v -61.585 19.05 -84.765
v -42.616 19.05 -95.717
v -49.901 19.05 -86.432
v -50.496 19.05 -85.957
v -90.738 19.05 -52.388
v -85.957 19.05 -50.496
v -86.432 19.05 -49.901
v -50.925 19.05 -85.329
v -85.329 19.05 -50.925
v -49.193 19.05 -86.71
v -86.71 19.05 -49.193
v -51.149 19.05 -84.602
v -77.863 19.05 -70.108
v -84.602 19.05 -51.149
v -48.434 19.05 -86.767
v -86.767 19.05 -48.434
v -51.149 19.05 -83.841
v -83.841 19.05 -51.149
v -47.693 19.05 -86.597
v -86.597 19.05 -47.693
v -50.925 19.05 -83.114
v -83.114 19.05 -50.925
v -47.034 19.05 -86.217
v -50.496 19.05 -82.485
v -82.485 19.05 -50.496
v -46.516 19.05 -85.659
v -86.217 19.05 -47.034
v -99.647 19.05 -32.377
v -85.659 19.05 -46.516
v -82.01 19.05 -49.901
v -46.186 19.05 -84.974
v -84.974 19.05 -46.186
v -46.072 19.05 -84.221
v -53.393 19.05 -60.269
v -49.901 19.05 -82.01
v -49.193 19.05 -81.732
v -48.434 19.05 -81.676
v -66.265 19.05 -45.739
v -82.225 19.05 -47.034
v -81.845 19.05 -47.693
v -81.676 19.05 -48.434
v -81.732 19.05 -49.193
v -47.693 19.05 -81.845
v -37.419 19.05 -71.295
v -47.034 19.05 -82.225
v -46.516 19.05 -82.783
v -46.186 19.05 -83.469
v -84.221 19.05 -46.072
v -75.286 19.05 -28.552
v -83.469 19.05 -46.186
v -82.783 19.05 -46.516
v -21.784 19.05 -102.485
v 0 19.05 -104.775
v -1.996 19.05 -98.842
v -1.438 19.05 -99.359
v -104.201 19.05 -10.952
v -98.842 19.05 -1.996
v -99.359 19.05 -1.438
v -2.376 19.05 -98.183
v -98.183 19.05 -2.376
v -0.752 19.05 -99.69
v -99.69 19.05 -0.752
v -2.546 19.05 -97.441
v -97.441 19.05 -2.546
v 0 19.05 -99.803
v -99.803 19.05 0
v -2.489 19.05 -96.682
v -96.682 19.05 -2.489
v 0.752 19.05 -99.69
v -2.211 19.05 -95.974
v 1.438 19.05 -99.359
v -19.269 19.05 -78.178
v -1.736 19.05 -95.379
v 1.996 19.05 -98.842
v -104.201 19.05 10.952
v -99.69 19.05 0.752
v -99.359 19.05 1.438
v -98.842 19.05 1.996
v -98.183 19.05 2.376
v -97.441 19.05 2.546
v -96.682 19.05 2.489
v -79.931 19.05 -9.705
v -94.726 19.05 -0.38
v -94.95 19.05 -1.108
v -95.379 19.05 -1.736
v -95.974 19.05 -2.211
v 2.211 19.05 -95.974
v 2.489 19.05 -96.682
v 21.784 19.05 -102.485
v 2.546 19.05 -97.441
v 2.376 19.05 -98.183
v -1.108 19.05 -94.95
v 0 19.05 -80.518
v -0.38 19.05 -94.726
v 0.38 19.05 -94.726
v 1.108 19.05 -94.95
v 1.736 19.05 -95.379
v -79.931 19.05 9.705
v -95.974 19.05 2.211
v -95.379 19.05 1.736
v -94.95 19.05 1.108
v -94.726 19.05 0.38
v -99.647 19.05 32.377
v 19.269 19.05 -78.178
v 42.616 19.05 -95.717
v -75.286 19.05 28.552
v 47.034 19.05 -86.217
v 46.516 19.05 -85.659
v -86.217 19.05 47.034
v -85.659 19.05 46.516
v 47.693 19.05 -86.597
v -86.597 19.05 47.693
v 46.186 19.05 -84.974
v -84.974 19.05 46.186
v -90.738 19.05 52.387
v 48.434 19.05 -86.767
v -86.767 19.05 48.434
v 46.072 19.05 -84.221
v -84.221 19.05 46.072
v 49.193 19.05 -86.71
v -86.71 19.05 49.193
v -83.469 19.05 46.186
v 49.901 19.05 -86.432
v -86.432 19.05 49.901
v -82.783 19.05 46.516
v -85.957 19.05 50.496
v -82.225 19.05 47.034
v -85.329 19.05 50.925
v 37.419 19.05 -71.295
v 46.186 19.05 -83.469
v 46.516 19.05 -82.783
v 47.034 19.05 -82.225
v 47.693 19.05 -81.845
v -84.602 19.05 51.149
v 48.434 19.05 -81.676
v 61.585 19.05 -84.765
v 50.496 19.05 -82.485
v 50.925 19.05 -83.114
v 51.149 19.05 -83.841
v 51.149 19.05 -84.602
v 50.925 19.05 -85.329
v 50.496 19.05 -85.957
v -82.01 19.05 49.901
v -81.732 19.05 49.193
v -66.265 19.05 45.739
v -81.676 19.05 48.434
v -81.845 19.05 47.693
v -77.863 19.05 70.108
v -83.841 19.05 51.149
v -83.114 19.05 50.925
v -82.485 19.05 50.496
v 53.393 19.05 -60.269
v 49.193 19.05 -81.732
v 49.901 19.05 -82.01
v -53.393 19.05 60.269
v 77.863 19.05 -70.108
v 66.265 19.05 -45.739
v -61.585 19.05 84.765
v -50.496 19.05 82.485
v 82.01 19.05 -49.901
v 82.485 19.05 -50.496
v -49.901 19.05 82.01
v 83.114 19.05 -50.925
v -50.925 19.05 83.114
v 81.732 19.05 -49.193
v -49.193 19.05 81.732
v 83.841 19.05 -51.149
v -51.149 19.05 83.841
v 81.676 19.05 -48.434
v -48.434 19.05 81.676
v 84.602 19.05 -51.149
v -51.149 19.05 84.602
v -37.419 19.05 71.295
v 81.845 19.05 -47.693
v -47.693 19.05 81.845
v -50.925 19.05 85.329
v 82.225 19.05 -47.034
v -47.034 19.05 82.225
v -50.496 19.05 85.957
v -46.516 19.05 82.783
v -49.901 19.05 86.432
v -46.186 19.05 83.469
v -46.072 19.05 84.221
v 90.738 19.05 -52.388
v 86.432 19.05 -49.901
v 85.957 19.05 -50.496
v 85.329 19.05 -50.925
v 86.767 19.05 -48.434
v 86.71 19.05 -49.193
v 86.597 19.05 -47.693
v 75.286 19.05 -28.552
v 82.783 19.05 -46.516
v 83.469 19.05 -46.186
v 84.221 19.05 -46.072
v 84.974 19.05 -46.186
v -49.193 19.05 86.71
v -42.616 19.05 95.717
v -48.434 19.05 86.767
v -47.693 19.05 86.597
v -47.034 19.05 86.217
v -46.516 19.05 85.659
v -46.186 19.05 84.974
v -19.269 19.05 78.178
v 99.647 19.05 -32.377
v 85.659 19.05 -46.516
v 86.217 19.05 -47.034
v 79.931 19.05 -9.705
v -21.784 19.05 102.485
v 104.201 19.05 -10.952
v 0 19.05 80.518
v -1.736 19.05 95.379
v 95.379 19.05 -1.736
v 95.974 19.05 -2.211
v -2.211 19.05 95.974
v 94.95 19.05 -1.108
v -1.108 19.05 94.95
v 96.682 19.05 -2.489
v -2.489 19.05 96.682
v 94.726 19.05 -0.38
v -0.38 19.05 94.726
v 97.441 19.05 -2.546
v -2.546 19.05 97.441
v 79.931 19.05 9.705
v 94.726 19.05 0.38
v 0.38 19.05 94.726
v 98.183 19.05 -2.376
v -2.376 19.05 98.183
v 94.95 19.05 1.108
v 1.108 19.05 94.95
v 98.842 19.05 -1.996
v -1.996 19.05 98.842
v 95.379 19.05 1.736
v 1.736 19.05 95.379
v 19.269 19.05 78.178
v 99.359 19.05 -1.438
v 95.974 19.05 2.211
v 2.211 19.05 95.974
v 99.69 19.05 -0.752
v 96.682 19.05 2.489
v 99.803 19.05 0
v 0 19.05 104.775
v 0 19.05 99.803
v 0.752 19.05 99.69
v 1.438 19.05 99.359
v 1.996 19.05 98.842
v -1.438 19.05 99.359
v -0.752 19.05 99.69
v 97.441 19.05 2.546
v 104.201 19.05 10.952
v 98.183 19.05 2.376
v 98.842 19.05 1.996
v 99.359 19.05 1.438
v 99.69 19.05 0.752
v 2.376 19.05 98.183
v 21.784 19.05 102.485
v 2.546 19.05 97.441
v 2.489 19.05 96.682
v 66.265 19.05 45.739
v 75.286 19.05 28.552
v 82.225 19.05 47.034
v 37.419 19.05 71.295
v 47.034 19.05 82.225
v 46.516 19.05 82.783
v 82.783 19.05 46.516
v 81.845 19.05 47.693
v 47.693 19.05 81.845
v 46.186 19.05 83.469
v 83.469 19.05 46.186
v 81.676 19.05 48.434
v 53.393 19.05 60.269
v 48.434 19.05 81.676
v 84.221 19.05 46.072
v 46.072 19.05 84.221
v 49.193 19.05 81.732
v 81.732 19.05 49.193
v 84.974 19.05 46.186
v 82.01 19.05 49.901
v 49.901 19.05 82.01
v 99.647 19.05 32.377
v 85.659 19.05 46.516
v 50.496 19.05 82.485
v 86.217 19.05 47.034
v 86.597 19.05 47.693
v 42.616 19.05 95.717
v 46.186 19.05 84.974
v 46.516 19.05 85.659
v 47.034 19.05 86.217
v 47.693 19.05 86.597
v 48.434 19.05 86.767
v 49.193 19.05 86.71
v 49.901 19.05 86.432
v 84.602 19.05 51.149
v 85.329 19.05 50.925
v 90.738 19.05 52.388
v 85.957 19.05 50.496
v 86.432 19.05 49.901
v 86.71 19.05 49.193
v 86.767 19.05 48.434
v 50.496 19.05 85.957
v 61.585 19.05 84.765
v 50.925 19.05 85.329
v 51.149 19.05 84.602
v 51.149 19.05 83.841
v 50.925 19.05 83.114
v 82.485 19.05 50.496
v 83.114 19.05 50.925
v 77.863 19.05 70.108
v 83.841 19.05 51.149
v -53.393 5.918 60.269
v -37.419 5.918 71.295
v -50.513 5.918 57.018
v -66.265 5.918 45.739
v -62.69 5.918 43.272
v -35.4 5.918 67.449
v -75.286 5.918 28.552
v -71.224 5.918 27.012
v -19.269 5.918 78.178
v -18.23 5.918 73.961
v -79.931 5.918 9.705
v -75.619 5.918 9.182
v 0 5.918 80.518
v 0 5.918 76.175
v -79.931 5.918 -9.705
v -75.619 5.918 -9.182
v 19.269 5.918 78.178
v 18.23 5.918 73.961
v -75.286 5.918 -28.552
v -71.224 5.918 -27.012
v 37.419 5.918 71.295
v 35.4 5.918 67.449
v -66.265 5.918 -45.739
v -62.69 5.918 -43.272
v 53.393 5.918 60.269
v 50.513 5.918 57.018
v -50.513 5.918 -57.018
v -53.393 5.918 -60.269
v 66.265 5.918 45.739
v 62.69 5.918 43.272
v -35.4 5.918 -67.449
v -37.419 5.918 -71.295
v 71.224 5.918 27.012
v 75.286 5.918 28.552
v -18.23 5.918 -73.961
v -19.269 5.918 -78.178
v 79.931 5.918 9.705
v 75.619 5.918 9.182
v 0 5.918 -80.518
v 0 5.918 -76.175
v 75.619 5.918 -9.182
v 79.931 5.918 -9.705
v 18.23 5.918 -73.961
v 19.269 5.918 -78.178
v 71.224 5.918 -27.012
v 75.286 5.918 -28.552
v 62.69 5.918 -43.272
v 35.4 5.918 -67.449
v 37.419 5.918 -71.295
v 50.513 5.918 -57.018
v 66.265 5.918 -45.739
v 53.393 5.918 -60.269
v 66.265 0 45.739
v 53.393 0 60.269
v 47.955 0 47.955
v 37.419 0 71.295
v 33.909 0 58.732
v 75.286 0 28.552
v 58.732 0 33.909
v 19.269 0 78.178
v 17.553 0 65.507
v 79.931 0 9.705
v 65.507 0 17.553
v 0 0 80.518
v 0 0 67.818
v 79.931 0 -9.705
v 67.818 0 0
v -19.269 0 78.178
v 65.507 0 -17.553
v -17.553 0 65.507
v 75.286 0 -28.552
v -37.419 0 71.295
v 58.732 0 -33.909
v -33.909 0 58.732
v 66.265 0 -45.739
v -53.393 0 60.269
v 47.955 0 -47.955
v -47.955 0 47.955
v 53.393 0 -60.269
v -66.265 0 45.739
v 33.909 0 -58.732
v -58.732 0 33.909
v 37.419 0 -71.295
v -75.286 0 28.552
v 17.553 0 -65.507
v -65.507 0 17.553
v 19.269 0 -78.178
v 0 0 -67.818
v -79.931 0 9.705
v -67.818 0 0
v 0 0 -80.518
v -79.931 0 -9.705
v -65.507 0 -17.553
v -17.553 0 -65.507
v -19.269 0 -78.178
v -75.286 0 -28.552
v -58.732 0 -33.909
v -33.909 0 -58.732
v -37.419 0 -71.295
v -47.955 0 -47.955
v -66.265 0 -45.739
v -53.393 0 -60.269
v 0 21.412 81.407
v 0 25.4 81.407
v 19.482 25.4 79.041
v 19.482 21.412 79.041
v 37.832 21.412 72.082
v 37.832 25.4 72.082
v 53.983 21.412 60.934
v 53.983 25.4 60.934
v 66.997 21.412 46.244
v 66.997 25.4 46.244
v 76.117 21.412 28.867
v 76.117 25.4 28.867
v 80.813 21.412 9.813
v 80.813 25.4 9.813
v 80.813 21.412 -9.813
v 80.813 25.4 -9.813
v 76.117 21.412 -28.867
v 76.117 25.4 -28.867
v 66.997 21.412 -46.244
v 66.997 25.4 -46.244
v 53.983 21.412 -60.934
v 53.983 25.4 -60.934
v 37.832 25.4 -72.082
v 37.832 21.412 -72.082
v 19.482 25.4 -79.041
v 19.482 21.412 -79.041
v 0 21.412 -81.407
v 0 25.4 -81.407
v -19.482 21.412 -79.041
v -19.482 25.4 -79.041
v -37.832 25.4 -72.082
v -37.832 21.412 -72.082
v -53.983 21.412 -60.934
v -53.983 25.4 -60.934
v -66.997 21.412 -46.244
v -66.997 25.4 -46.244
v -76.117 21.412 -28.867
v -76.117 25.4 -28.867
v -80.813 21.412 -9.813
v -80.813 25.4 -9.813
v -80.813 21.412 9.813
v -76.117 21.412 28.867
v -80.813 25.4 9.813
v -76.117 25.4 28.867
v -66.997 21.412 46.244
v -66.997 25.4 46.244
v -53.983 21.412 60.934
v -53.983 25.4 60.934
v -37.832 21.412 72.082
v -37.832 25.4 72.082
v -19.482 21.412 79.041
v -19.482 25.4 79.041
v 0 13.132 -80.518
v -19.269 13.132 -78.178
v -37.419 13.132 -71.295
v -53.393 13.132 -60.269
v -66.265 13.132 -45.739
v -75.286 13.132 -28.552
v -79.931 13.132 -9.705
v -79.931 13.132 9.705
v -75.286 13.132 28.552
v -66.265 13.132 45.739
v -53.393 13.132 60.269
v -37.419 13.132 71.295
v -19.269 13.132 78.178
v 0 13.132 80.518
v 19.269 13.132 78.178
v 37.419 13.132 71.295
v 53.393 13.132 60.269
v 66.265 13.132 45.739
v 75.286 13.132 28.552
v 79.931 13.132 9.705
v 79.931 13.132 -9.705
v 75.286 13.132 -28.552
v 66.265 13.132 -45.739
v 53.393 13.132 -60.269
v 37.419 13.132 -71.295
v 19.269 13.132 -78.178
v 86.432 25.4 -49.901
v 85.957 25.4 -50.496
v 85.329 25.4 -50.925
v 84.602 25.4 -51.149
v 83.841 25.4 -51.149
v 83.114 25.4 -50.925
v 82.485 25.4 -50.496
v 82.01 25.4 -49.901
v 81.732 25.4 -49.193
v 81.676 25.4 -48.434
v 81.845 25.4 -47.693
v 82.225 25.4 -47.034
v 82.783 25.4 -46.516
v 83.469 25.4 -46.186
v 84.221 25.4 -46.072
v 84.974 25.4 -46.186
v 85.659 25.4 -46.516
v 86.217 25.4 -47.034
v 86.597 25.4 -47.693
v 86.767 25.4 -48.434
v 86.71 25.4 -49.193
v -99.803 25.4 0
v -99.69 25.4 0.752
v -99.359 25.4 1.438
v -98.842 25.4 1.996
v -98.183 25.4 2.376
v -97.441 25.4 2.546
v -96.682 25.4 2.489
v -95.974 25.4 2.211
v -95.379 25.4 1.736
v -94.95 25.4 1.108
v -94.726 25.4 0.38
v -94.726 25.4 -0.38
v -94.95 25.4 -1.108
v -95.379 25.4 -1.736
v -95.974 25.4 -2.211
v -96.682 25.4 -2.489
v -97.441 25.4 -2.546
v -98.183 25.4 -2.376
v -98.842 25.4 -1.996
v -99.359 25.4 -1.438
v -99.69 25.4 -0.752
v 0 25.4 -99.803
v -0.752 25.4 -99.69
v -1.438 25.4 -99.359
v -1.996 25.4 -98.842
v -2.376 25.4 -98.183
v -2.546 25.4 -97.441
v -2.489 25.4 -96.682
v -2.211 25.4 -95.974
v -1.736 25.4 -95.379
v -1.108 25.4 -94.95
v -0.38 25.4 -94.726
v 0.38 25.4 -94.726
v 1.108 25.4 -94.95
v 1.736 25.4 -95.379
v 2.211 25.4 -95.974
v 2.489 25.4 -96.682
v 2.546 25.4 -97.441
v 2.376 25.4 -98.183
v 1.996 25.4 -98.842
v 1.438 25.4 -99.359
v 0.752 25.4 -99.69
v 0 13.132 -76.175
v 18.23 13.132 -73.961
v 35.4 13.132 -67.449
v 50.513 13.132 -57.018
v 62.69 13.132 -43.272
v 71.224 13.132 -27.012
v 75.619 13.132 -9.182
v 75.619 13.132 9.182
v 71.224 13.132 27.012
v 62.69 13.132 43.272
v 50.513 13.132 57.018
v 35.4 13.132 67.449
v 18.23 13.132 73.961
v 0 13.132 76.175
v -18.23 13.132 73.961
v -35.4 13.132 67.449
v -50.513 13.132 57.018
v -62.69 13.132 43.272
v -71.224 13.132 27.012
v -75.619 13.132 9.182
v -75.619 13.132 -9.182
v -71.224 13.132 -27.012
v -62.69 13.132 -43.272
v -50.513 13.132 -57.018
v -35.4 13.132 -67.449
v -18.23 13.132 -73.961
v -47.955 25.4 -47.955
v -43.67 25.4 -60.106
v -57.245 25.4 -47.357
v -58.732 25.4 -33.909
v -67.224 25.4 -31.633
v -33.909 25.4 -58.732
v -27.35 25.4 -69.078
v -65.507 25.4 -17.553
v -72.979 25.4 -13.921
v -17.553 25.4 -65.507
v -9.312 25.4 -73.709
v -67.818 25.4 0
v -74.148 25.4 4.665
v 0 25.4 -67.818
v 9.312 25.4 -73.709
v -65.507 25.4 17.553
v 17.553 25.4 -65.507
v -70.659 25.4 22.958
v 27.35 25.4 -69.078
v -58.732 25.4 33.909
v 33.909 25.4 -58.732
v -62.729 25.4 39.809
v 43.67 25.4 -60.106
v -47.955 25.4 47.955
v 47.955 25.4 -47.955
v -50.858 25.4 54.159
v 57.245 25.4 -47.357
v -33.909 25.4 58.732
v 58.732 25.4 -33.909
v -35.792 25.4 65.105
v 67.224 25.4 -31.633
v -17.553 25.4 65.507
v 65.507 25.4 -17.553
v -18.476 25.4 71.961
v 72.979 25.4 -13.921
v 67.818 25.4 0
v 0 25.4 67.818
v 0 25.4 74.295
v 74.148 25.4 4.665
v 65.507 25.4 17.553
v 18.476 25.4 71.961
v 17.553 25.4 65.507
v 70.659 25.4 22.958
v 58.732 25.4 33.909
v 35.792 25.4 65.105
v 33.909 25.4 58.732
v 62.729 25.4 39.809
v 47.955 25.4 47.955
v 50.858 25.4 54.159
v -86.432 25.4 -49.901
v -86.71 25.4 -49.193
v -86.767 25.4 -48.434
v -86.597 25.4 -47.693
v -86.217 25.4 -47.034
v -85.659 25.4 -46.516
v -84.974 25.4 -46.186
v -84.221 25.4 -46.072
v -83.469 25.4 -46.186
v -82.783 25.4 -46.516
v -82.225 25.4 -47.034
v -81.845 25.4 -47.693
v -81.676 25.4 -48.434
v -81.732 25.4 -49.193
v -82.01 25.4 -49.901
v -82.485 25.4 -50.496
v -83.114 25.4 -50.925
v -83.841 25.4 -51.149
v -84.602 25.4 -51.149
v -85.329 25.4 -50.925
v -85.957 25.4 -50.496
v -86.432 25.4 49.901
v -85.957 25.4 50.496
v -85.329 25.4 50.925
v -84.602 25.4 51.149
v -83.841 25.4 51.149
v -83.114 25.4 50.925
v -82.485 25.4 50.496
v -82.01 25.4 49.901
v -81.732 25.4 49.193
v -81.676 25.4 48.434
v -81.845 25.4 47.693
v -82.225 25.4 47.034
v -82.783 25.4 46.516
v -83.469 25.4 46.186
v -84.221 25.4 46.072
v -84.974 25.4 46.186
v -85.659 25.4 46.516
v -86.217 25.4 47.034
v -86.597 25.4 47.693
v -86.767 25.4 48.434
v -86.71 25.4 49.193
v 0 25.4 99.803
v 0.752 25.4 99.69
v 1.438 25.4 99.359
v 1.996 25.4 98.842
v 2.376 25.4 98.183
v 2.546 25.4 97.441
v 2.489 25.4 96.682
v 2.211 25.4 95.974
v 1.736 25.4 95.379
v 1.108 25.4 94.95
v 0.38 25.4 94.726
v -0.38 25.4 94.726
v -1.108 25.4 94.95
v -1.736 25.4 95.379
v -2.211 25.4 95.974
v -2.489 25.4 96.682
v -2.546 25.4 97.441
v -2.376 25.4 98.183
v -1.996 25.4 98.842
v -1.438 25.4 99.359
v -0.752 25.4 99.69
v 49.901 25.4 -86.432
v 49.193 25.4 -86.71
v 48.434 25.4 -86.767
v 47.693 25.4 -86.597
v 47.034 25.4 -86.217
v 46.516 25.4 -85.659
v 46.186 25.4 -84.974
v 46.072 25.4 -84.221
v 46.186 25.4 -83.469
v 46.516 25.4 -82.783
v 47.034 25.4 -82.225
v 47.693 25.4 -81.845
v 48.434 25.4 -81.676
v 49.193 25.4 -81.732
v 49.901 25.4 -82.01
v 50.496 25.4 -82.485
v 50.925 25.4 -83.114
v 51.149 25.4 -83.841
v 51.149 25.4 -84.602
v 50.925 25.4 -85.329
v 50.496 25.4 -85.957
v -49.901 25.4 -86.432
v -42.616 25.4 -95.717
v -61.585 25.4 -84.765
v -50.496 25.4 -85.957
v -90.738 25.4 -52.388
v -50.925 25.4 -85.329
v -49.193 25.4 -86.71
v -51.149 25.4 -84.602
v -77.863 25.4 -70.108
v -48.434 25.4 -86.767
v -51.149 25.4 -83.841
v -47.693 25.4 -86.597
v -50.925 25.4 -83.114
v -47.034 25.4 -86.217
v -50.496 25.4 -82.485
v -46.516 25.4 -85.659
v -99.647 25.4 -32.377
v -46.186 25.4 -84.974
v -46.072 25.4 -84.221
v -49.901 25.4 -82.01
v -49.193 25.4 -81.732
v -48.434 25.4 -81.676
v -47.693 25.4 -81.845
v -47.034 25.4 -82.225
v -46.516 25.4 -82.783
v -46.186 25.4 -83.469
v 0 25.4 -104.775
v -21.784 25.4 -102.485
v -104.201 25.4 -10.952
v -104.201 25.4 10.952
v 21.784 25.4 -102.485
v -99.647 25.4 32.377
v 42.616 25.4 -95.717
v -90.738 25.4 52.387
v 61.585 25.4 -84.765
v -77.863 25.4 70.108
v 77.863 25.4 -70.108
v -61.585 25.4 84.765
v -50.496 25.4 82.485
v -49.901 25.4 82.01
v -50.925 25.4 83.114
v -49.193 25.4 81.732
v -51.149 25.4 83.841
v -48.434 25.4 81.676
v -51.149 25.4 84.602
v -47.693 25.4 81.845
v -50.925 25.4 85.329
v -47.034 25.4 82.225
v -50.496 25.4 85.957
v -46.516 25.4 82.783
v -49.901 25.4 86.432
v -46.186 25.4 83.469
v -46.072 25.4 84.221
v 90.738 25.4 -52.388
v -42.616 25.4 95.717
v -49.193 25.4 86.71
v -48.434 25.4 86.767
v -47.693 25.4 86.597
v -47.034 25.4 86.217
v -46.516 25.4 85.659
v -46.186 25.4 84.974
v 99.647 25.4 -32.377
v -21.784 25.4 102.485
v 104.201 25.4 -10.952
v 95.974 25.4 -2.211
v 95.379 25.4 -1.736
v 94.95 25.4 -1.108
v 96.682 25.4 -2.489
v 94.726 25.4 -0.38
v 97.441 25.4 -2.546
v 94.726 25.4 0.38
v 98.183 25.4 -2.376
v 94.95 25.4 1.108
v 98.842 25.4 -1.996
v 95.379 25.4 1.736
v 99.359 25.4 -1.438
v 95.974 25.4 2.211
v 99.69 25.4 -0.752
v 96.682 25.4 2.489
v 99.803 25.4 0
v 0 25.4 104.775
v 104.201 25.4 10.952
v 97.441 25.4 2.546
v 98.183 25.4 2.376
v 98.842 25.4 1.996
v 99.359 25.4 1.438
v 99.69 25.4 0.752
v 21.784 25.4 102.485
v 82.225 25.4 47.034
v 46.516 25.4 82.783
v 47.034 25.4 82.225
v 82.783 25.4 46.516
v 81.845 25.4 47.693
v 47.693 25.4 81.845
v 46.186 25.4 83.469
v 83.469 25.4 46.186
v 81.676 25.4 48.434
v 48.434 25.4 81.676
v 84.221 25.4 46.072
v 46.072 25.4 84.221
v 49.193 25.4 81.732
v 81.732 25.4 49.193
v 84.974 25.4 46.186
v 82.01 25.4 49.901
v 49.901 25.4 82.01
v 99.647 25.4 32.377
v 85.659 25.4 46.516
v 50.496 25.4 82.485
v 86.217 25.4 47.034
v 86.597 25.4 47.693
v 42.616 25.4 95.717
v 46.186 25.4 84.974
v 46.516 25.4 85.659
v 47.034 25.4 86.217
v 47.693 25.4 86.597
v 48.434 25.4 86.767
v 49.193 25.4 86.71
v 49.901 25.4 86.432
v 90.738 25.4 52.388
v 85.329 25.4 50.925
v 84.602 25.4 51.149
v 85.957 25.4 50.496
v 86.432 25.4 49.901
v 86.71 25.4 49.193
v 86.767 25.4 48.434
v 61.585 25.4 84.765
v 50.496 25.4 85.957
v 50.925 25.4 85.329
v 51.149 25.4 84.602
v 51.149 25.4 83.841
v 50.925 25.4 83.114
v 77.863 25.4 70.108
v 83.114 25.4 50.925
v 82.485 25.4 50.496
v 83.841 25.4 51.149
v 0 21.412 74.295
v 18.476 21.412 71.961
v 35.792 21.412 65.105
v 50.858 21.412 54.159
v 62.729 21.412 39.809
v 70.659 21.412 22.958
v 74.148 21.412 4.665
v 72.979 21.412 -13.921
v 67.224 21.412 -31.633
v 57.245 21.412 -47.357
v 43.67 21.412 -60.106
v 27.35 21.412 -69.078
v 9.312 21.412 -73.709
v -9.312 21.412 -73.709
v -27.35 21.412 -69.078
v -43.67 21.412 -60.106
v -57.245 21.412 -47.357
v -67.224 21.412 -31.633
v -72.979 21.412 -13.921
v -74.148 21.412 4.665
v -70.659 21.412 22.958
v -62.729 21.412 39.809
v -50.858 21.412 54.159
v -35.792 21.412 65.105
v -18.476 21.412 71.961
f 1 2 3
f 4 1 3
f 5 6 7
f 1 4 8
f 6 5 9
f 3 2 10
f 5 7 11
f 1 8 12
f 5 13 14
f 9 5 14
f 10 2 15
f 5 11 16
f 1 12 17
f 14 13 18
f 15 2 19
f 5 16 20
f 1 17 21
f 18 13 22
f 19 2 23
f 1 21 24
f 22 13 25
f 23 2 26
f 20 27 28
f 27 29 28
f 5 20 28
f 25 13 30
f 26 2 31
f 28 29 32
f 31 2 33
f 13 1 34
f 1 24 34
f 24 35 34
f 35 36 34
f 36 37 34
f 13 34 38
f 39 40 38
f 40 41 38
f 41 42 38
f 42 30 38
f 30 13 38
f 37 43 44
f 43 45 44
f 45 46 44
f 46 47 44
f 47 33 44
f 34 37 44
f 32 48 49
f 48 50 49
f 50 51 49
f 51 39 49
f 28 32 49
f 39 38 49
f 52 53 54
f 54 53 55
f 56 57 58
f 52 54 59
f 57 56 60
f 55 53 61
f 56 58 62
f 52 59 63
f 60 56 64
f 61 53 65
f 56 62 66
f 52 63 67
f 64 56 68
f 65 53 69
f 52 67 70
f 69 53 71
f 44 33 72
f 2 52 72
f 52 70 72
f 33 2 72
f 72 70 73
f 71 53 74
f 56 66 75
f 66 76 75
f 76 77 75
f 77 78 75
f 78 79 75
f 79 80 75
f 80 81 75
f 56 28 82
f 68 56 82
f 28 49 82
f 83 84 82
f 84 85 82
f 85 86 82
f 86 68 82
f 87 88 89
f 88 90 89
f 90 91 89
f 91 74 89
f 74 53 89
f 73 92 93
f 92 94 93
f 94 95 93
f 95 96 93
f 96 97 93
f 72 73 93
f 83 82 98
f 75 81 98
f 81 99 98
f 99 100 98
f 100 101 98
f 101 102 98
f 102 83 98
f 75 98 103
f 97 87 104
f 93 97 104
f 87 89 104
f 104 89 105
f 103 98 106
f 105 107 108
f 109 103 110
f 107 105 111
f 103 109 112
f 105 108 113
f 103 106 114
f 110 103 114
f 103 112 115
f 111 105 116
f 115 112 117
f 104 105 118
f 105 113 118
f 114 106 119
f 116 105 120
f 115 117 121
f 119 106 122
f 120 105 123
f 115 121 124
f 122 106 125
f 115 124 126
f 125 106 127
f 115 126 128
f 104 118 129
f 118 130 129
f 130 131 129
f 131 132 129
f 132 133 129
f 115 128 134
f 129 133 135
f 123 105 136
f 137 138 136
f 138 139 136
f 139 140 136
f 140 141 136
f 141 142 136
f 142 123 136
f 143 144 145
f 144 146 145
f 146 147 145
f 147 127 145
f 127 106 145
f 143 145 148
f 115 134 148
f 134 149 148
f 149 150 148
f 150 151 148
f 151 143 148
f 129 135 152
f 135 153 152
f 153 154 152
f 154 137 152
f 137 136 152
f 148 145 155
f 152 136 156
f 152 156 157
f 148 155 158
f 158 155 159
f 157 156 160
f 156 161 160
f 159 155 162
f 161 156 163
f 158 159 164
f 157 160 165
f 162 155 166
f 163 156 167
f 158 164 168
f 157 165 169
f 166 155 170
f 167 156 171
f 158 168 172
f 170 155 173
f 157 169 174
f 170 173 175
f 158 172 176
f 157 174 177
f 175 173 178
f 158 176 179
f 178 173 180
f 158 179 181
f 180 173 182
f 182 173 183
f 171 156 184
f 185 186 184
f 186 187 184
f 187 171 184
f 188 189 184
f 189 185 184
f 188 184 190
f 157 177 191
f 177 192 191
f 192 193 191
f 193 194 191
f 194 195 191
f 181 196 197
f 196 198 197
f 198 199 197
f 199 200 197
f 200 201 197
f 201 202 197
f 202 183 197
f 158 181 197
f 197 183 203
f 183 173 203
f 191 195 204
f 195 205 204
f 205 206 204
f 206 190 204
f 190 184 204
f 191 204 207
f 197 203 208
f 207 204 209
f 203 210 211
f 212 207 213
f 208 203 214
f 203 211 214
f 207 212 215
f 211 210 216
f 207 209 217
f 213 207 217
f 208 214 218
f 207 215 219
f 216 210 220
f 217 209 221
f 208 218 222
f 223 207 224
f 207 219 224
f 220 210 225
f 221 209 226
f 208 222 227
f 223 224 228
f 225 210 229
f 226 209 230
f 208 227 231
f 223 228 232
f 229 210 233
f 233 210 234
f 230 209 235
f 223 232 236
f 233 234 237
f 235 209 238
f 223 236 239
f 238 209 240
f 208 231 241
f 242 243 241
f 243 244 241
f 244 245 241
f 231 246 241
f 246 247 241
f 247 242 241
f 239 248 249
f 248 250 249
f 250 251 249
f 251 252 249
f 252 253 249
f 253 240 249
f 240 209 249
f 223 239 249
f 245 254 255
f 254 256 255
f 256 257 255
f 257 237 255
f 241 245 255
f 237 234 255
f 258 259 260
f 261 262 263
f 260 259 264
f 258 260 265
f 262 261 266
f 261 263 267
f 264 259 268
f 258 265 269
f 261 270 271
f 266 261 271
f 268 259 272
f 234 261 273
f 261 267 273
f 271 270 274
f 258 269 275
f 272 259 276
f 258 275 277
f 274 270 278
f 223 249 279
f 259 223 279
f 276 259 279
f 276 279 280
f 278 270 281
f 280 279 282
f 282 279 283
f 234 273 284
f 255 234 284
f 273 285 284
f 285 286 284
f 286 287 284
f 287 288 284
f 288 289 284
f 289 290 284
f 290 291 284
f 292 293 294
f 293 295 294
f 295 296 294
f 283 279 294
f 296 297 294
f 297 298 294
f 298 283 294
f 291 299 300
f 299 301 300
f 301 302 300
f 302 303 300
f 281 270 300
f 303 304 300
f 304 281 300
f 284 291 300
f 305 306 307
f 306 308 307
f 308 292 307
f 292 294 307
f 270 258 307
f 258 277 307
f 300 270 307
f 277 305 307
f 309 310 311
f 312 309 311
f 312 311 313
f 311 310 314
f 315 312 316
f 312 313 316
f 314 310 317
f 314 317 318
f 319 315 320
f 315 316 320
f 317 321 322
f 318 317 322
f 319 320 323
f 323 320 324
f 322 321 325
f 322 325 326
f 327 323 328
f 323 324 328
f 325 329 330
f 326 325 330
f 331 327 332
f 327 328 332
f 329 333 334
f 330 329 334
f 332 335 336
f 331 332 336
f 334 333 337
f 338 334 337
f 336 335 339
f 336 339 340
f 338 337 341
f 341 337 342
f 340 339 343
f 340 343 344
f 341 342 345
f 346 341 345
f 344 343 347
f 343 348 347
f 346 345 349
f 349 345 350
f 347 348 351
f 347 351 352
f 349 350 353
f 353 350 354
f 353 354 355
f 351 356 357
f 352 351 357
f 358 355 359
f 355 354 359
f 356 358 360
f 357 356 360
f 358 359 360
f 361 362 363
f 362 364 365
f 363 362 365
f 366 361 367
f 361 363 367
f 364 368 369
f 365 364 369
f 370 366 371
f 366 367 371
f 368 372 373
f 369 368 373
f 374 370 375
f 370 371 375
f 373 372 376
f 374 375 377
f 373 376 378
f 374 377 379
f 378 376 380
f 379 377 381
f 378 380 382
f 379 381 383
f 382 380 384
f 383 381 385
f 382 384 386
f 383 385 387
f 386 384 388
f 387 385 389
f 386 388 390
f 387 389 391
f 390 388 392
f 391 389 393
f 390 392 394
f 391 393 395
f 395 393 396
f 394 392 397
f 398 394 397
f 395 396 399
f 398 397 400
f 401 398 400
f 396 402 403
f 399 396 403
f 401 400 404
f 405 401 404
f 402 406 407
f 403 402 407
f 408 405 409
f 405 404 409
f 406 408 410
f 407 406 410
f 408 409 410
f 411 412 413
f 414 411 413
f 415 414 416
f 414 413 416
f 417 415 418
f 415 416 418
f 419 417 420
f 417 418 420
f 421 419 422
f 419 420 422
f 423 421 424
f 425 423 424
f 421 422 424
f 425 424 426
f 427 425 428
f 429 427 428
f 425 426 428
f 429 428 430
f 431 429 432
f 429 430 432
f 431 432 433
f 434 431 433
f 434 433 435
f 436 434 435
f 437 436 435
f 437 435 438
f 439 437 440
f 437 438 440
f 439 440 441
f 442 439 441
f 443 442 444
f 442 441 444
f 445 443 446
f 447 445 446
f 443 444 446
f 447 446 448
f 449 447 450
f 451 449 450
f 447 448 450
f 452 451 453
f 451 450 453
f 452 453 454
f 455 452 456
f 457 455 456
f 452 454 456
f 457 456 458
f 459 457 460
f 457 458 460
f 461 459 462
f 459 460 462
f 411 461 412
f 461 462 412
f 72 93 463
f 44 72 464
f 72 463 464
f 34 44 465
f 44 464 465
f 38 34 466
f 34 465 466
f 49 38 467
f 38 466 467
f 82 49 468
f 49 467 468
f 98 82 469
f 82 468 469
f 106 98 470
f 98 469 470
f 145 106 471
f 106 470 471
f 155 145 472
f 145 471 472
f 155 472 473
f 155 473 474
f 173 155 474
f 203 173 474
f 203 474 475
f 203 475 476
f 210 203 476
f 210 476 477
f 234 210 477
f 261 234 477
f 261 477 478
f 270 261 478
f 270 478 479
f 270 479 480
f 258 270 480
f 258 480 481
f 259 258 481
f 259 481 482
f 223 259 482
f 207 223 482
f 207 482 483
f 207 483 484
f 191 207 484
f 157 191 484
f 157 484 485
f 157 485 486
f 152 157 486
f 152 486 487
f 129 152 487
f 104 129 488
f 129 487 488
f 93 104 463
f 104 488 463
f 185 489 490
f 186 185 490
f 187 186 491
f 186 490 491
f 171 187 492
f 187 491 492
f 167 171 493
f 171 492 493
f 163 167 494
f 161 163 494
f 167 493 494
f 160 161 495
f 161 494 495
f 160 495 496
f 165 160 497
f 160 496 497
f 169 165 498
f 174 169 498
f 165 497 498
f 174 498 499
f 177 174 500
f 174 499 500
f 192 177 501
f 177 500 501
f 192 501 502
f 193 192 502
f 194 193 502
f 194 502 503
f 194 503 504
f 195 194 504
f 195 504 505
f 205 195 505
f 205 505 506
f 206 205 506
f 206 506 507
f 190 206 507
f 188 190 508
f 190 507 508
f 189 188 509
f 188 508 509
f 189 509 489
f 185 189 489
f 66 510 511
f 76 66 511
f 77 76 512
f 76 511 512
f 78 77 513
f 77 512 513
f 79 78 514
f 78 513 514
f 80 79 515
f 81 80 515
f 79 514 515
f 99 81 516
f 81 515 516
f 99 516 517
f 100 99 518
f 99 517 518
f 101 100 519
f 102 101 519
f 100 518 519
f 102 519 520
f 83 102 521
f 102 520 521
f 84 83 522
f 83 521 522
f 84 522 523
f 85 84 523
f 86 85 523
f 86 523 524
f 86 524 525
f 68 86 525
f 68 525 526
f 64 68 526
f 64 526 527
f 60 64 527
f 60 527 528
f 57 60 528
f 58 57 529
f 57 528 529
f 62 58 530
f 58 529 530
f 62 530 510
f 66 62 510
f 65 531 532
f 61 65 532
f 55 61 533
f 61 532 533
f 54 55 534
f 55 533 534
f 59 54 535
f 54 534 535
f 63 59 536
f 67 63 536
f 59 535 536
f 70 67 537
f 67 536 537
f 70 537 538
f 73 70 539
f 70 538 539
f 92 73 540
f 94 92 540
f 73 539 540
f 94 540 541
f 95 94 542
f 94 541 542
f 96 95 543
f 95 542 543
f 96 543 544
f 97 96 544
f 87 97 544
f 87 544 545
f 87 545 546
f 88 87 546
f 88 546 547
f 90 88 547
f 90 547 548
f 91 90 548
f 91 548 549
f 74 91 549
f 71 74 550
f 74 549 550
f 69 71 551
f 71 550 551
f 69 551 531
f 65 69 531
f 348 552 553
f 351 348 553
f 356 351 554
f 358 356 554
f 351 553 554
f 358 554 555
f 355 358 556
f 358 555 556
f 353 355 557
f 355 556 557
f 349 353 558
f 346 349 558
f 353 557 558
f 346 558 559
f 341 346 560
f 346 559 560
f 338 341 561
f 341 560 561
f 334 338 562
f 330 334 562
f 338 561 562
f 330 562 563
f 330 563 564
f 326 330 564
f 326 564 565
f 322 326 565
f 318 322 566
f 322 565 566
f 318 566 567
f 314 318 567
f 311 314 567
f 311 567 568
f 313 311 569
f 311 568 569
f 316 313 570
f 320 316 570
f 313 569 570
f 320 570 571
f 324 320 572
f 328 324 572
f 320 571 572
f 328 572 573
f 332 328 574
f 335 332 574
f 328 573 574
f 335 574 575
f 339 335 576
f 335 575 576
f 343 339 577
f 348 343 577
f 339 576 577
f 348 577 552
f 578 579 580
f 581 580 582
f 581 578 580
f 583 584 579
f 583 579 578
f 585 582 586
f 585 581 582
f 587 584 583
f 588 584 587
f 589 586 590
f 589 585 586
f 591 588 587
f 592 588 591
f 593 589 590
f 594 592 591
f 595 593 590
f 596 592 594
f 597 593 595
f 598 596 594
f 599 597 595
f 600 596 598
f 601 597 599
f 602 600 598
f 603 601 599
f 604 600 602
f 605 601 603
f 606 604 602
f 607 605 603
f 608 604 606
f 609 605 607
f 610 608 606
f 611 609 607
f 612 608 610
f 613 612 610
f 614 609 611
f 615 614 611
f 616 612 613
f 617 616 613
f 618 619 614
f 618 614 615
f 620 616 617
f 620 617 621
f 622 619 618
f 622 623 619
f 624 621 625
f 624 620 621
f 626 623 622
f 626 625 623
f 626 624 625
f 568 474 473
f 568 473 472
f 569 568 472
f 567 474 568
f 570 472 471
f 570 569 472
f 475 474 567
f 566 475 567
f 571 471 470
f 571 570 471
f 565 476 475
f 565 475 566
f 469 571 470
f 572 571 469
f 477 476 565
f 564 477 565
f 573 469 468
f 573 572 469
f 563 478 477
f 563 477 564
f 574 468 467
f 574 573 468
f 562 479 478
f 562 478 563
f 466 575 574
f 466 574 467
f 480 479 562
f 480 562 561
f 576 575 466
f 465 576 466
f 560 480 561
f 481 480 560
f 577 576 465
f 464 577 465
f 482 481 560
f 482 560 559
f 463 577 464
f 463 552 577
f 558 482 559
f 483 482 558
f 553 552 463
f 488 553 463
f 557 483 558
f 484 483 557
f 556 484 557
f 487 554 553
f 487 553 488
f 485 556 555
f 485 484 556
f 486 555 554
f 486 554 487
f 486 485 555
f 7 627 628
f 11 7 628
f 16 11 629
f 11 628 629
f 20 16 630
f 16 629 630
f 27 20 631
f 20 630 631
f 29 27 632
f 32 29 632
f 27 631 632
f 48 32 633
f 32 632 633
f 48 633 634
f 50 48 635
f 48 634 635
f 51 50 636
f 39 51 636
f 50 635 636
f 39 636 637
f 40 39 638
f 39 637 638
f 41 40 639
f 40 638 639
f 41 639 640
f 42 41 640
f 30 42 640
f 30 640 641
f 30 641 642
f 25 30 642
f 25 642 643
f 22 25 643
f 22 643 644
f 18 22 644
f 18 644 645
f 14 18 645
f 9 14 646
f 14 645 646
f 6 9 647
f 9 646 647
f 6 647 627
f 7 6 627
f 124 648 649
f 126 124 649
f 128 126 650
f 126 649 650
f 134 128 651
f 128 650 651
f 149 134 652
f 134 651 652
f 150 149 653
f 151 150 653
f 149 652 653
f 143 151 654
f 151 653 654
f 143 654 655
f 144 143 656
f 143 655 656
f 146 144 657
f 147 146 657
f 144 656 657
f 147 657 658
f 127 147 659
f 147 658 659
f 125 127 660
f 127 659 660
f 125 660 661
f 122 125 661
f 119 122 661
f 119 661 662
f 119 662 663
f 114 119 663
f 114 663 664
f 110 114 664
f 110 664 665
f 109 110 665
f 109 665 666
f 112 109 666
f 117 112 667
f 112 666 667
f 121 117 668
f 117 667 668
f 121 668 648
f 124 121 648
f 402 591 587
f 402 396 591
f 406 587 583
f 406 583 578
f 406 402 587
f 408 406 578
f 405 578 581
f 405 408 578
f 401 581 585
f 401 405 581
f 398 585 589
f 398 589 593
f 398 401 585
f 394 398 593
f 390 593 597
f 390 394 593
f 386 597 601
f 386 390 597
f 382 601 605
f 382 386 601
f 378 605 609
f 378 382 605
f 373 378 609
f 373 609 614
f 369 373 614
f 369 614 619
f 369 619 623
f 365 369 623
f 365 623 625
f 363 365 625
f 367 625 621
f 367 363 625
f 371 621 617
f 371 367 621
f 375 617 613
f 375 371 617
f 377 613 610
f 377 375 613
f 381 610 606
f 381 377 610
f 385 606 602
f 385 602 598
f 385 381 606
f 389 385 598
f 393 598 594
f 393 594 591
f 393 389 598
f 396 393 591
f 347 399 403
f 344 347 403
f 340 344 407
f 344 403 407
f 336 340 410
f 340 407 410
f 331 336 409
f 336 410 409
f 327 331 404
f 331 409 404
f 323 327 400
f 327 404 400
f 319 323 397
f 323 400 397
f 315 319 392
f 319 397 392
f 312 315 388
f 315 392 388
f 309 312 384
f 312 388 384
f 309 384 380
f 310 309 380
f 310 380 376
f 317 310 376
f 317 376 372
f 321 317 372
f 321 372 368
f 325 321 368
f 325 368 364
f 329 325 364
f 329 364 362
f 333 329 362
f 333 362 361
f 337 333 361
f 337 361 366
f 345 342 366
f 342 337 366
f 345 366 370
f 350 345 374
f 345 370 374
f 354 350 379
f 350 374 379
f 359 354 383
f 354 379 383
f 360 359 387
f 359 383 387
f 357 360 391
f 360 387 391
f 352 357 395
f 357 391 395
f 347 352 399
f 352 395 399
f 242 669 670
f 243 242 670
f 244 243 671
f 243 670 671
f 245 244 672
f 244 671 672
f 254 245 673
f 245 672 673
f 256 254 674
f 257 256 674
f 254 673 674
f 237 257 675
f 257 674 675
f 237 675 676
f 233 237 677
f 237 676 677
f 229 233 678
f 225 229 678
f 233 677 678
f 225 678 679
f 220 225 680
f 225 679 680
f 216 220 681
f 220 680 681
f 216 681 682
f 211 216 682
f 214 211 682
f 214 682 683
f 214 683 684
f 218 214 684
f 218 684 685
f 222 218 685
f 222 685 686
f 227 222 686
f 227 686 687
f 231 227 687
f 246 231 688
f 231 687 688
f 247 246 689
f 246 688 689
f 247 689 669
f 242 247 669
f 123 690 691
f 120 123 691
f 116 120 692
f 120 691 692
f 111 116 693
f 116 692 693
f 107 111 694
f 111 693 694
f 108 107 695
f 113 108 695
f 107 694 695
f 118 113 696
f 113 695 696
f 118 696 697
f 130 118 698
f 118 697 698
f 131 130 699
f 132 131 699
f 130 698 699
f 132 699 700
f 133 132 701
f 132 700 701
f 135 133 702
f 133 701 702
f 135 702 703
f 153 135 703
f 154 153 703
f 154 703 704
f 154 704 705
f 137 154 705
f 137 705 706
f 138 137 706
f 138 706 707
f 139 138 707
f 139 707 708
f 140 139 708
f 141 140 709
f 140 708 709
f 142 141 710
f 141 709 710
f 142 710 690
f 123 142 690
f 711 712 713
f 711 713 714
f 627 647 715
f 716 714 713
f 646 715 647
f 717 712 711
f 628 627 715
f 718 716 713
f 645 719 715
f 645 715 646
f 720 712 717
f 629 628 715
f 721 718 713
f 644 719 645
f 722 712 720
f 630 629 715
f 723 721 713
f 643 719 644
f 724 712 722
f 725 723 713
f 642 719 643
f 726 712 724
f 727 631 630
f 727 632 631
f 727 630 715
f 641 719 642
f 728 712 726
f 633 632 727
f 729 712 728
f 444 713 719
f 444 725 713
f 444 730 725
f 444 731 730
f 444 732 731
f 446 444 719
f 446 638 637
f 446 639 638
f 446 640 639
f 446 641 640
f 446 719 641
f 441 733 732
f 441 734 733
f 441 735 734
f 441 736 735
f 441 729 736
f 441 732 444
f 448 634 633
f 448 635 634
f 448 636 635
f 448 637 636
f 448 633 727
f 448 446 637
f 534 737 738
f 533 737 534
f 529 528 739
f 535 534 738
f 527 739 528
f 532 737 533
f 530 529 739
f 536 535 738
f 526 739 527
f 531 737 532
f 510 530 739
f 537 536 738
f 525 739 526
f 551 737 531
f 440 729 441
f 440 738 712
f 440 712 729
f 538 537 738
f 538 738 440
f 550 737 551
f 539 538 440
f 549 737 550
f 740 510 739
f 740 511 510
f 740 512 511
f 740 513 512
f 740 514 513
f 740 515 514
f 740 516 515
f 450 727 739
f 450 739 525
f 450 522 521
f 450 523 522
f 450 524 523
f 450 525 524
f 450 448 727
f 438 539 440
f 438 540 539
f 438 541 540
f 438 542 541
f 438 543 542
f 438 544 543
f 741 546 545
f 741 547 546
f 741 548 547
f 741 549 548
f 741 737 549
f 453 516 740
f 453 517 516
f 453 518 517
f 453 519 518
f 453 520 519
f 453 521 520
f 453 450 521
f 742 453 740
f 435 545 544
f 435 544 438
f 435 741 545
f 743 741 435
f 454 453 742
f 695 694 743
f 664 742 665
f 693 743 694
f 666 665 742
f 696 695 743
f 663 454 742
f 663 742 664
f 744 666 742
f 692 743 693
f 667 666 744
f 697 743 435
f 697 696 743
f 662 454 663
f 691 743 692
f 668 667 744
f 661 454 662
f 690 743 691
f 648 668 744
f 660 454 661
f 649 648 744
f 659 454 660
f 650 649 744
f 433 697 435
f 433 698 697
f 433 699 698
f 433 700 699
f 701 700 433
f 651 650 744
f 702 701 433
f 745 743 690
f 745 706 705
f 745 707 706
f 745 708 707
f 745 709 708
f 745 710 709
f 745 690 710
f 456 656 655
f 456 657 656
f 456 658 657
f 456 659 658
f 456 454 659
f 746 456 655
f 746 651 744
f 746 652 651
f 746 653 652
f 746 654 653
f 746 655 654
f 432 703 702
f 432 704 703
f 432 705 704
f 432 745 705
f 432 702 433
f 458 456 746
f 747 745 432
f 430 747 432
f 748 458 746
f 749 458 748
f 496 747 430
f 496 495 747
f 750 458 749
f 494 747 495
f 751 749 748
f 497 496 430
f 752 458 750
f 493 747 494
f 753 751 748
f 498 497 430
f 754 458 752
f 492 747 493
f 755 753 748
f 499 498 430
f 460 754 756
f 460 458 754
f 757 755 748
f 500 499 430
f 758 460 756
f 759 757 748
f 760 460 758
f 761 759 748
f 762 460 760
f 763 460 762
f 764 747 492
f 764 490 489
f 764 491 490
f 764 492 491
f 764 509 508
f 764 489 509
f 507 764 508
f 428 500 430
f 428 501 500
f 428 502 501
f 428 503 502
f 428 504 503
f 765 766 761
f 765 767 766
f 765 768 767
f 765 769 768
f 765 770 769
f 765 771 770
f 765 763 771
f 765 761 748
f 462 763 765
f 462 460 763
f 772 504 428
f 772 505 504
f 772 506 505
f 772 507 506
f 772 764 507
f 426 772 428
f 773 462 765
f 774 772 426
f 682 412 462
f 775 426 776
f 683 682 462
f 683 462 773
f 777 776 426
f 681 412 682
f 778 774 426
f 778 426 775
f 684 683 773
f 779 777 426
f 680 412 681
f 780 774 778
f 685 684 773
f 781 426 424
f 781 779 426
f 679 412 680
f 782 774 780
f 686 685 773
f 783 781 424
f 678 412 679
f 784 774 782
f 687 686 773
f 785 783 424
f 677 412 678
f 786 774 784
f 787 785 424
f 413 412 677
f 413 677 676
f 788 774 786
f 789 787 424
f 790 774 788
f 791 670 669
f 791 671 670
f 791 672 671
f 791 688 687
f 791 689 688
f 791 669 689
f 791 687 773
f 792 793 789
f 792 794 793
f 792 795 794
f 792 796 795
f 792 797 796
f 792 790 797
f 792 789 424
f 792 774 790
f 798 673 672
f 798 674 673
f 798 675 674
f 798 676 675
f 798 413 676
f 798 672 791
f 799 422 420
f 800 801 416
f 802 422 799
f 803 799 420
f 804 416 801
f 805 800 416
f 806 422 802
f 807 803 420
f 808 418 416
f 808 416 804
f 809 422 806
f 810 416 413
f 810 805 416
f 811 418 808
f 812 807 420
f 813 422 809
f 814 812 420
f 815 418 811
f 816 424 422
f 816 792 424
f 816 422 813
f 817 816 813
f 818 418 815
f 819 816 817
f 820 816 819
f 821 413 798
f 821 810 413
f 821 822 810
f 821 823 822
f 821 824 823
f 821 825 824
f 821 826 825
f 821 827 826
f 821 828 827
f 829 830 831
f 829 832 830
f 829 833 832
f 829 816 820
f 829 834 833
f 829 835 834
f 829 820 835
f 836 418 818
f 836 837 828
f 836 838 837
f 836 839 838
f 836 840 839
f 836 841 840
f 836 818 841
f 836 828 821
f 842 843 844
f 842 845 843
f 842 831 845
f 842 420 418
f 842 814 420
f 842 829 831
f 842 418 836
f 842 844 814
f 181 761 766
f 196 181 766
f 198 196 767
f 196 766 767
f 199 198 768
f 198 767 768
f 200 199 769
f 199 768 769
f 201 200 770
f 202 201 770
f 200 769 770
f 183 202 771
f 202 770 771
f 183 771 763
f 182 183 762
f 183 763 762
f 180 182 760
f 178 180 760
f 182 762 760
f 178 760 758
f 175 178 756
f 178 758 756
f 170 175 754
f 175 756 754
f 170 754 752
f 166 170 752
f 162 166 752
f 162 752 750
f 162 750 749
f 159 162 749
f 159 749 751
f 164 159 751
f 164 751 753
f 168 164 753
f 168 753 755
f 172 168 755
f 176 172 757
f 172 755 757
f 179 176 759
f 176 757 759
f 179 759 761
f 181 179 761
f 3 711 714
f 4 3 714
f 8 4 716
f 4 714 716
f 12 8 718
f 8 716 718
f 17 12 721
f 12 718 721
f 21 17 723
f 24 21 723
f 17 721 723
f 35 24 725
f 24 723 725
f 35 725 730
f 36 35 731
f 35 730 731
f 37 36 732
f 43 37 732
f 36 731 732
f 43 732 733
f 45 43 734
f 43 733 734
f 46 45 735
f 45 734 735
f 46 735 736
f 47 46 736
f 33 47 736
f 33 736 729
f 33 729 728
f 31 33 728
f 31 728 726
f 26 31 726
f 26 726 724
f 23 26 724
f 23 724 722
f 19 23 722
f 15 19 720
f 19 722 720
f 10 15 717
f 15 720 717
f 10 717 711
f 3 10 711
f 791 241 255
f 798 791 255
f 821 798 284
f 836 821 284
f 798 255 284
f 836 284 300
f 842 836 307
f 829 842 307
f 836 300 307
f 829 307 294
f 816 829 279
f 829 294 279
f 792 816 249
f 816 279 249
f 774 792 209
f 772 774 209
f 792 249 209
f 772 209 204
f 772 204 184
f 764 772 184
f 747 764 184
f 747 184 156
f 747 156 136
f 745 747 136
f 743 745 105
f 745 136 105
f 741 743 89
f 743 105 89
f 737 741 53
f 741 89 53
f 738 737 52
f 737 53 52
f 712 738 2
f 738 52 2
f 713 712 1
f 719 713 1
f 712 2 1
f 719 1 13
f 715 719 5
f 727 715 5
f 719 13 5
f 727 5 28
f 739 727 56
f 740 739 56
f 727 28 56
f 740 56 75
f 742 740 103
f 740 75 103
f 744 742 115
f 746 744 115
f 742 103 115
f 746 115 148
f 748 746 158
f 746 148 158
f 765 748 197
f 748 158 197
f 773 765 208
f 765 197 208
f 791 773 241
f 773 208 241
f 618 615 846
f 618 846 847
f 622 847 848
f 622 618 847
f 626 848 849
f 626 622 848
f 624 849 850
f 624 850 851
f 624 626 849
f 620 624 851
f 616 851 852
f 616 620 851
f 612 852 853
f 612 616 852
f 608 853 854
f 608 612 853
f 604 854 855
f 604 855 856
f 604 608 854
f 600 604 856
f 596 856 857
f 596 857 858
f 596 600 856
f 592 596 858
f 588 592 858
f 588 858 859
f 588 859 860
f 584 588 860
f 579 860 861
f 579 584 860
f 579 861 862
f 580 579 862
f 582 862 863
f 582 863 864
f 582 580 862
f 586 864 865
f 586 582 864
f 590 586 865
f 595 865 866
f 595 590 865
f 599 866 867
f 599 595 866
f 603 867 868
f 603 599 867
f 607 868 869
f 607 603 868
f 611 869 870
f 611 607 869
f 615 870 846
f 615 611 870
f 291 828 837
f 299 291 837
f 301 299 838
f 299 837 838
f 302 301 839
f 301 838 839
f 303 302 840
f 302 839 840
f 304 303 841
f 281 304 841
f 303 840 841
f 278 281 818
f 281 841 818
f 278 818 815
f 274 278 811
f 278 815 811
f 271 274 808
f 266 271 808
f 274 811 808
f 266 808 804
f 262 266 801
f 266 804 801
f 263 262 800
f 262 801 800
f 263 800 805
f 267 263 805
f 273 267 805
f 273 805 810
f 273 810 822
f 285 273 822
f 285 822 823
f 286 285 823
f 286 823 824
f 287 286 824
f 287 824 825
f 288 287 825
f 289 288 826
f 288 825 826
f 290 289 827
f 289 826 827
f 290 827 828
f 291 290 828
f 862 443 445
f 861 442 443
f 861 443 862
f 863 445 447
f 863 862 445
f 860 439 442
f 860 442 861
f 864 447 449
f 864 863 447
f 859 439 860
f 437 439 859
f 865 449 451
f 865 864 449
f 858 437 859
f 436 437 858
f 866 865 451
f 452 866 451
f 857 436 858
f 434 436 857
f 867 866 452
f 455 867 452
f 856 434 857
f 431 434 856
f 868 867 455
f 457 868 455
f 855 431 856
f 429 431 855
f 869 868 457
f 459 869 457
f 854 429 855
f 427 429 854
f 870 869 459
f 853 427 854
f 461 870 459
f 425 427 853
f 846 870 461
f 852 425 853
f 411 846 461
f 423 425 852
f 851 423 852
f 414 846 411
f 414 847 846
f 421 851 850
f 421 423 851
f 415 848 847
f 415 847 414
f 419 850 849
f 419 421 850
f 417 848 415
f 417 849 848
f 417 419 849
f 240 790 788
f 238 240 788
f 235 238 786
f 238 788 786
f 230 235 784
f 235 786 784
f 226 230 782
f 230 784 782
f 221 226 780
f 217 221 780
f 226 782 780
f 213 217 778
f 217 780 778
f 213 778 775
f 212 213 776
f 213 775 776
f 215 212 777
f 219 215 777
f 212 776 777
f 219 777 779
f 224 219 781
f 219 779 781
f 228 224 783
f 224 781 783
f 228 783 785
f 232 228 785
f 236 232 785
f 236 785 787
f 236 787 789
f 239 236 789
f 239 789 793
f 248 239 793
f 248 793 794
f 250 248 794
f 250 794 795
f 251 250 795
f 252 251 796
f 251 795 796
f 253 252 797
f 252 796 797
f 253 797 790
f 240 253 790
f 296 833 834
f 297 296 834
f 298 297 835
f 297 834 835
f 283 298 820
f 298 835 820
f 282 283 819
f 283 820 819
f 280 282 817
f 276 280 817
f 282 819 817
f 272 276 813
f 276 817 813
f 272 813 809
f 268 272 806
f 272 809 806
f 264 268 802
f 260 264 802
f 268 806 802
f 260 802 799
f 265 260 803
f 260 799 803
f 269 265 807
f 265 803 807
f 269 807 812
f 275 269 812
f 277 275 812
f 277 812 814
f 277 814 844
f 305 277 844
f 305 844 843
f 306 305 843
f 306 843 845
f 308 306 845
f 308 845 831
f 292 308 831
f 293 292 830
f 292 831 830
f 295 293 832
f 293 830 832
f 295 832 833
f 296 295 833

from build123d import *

# Parameters (mm, degrees)
SKETCH1_R               = 80.518
SKETCH1_R_2             = 67.818
INNER_CYLINDER_DEPTH    = 19.05
SKETCH2_R               = 104.775
SKETCH2_R_2             = 67.818
FLANGE_DEPTH            = 6.35
SKETCH4_R               = 81.407
SKETCH4_R_2             = 74.295
GROOVE_DEPTH            = 3.9878
SKETCH5_R               = 2.5527
SCREW_HOLES_DEPTH       = 6.35
CIRPATTERN1_COUNT       = 12
CUT_EXTRUDE1_DEPTH      = 3.6068
CUT_EXTRUDE1_DEPTH_BACK = 3.6068
SKETCH7_R               = 80.518
SKETCH7_R_2             = 76.1746


with BuildPart() as part:
    # Sketch1 → Inner Cylinder (new body)
    with BuildSketch(Plane(origin=(0, 0, 0), x_dir=(1, 0, 0), z_dir=(0, 1, 0))):
        with Locations(Location((0, 0, 0), (0, 0, 90))):
            Circle(SKETCH1_R)
        with Locations(Location((0, 0, 0), (0, 0, 90))):
            Circle(SKETCH1_R_2, mode=Mode.SUBTRACT)
    extrude(amount=INNER_CYLINDER_DEPTH)

    # Sketch2 → Flange (add)
    with BuildSketch(Plane(origin=(0, 19.05, 0), x_dir=(1, 0, 0), z_dir=(0, 1, 0))):
        with Locations(Location((0, 0, 0), (0, 0, 270))):
            Circle(SKETCH2_R)
        with Locations(Location((0, 0, 0), (0, 0, 90))):
            Circle(SKETCH2_R_2, mode=Mode.SUBTRACT)
    extrude(amount=FLANGE_DEPTH)

    # Sketch4 → Groove (cut)
    with BuildSketch(Plane(origin=(0, 25.4, 0), x_dir=(1, 0, 0), z_dir=(0, 1, 0))):
        with Locations(Location((0, 0, 0), (0, 0, 270))):
            Circle(SKETCH4_R)
        with Locations(Location((0, 0, 0), (0, 0, 270))):
            Circle(SKETCH4_R_2, mode=Mode.SUBTRACT)
    extrude(amount=-GROOVE_DEPTH, mode=Mode.SUBTRACT)

    # Sketch5 → Screw Holes (cut)
    with BuildSketch(Plane(origin=(0, 25.4, 0), x_dir=(1, 0, 0), z_dir=(0, 1, 0))):
        with Locations(Location((0, -97.25025, 0), (0, 0, 270))):
            Circle(SKETCH5_R)
    screw_holes = extrude(amount=-SCREW_HOLES_DEPTH, mode=Mode.SUBTRACT)

    # CirPattern1: Screw Holes ×12 about axis
    cirpattern1_axis = Axis((0, 0, 0), (0, 1, 0))
    for i in range(1, CIRPATTERN1_COUNT):
        add(screw_holes.rotate(cirpattern1_axis, i * 360 / CIRPATTERN1_COUNT), mode=Mode.SUBTRACT)

    # Sketch7 → Cut-Extrude1 (cut, two sides: drawn at the far end of the back side and taken through both)
    with BuildSketch(Plane(origin=(0, 9.525, 0), x_dir=(-1, 0, 0), z_dir=(0, -1, 0)).offset(-CUT_EXTRUDE1_DEPTH_BACK)):
        with Locations(Location((0, 0, 0), (0, 0, 90))):
            Circle(SKETCH7_R)
        with Locations(Location((0, 0, 0), (0, 0, 90))):
            Circle(SKETCH7_R_2, mode=Mode.SUBTRACT)
    extrude(amount=CUT_EXTRUDE1_DEPTH + CUT_EXTRUDE1_DEPTH_BACK, mode=Mode.SUBTRACT)


solid = part.part
